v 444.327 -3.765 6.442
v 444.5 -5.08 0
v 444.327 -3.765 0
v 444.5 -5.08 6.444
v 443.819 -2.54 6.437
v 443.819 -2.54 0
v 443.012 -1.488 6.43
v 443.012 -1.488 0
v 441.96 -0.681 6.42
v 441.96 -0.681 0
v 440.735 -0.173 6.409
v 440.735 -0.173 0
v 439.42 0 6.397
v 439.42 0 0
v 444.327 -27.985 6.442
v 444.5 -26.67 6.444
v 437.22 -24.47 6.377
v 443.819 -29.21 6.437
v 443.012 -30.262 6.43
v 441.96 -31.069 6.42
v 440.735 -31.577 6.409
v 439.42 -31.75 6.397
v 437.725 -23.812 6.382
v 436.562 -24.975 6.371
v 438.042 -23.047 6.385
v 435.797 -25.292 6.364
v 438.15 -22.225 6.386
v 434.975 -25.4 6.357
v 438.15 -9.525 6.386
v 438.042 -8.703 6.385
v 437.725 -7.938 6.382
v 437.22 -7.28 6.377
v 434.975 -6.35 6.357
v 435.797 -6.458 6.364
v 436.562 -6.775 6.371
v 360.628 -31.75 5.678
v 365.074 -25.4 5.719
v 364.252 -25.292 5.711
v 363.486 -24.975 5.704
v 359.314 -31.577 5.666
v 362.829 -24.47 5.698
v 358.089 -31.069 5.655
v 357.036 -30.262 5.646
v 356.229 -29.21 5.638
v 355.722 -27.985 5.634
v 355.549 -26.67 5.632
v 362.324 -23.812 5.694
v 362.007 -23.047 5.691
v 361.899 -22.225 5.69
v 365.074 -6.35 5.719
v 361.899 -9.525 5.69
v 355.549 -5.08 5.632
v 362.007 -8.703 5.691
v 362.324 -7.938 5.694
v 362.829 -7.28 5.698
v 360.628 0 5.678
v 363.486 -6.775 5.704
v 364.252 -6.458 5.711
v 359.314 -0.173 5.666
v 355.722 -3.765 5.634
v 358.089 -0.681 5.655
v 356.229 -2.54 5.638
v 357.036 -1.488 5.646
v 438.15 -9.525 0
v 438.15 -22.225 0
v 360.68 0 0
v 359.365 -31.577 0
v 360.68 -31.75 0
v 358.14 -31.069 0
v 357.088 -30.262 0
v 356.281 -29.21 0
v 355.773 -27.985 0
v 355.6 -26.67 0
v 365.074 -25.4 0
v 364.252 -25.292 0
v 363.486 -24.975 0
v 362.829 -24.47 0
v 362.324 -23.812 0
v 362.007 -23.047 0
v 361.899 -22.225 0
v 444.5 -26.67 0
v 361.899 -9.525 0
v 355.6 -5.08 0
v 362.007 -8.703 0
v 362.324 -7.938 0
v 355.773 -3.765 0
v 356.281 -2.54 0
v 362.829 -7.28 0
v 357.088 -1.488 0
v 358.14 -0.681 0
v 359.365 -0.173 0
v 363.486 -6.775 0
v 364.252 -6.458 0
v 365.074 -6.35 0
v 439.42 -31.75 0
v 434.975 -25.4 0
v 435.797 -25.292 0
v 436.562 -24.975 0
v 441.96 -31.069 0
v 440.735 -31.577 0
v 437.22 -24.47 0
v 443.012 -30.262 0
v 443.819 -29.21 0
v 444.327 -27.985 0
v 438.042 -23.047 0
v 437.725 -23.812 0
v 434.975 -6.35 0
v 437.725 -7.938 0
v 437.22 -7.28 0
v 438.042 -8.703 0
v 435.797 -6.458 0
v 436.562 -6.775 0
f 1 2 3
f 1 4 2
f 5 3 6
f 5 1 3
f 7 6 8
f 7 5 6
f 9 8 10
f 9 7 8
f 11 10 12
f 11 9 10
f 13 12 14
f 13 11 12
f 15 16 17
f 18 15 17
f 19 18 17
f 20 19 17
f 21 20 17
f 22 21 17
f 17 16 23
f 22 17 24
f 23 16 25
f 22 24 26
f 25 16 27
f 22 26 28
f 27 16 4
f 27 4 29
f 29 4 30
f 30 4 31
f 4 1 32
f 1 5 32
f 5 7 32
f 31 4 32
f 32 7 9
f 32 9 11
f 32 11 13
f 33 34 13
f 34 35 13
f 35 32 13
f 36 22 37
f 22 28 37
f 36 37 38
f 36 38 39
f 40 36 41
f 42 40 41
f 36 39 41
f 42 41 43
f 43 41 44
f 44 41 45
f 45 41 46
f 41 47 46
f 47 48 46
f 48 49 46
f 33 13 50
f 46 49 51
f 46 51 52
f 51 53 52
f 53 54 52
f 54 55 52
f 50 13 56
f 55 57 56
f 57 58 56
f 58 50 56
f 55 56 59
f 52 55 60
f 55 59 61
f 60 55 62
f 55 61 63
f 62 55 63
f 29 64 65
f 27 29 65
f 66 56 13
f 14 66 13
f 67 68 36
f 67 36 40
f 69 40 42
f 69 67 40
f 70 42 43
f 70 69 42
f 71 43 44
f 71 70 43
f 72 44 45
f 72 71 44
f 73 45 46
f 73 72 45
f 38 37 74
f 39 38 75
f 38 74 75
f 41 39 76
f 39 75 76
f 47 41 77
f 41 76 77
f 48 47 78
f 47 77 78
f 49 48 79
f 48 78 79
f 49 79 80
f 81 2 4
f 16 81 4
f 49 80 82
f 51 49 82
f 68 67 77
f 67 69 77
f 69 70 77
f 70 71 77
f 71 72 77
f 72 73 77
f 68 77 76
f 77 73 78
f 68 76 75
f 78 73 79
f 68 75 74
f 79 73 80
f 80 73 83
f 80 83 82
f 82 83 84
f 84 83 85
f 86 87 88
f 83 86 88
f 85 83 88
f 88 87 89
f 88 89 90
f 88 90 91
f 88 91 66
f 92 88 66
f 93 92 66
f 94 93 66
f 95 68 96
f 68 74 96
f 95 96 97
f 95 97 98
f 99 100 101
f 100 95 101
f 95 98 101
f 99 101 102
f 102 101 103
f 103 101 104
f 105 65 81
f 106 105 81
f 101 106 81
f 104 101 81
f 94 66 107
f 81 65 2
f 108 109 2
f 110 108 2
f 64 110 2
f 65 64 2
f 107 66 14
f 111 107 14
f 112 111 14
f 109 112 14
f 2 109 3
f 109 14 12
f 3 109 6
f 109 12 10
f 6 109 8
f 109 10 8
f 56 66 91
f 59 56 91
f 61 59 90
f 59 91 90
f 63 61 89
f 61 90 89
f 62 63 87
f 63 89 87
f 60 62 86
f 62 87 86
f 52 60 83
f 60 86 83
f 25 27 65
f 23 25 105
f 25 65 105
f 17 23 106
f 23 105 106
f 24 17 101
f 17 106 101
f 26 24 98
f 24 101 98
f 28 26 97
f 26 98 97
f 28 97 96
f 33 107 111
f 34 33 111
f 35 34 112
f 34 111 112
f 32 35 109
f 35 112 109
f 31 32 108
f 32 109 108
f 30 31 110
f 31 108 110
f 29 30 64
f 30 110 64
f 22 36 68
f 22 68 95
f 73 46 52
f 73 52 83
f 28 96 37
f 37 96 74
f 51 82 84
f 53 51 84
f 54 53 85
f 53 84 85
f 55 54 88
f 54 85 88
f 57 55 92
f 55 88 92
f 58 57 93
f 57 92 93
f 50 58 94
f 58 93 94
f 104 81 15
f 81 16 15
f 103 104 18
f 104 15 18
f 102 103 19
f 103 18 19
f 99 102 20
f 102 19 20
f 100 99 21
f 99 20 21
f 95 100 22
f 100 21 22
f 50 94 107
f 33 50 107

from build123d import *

# Parameters (mm, degrees)
F3_DEPTH = 31.75
F5_DEPTH = 6.444662
F6_R     = 5.08


with BuildPart() as f3:
    # F2 (on Front) → F3 (new body)
    with BuildSketch(Plane.XZ):
        Polygon((444.5, 0), (444.5, 6.443663), (355.548608, 5.631981), (355.6, 0), align=None)
    extrude(amount=F3_DEPTH)

    # F4 (on face) → F5 (cut, through all)
    with BuildSketch(Plane(origin=(0, 0, 0), x_dir=(1, 0, 0), z_dir=(0, 0, -1))):
        with BuildLine():
            Line((434.975, 25.4), (365.073608, 25.4))
            ThreePointArc((365.073608, 25.4), (362.828544, 24.470064), (361.898608, 22.225))
            Line((361.898608, 22.225), (361.898608, 9.525))
            ThreePointArc((361.898608, 9.525), (362.828544, 7.279936), (365.073608, 6.35))
            Line((365.073608, 6.35), (434.975, 6.35))
            ThreePointArc((434.975, 6.35), (437.220064, 7.279936), (438.15, 9.525))
            Line((438.15, 9.525), (438.15, 22.225))
            ThreePointArc((438.15, 22.225), (437.220064, 24.470064), (434.975, 25.4))
        make_face()
    extrude(amount=-F5_DEPTH, mode=Mode.SUBTRACT)

    # F6
    f6_edges = [f3.edges().sort_by_distance(p)[0] for p in [
        (444.5, -31.75, 3.221831),
        (355.574304, -31.75, 2.815991),
        (355.574304, 0, 2.815991),
        (444.5, 0, 3.221831),
    ]]
    fillet(f6_edges, radius=F6_R)


solid = f3.part
